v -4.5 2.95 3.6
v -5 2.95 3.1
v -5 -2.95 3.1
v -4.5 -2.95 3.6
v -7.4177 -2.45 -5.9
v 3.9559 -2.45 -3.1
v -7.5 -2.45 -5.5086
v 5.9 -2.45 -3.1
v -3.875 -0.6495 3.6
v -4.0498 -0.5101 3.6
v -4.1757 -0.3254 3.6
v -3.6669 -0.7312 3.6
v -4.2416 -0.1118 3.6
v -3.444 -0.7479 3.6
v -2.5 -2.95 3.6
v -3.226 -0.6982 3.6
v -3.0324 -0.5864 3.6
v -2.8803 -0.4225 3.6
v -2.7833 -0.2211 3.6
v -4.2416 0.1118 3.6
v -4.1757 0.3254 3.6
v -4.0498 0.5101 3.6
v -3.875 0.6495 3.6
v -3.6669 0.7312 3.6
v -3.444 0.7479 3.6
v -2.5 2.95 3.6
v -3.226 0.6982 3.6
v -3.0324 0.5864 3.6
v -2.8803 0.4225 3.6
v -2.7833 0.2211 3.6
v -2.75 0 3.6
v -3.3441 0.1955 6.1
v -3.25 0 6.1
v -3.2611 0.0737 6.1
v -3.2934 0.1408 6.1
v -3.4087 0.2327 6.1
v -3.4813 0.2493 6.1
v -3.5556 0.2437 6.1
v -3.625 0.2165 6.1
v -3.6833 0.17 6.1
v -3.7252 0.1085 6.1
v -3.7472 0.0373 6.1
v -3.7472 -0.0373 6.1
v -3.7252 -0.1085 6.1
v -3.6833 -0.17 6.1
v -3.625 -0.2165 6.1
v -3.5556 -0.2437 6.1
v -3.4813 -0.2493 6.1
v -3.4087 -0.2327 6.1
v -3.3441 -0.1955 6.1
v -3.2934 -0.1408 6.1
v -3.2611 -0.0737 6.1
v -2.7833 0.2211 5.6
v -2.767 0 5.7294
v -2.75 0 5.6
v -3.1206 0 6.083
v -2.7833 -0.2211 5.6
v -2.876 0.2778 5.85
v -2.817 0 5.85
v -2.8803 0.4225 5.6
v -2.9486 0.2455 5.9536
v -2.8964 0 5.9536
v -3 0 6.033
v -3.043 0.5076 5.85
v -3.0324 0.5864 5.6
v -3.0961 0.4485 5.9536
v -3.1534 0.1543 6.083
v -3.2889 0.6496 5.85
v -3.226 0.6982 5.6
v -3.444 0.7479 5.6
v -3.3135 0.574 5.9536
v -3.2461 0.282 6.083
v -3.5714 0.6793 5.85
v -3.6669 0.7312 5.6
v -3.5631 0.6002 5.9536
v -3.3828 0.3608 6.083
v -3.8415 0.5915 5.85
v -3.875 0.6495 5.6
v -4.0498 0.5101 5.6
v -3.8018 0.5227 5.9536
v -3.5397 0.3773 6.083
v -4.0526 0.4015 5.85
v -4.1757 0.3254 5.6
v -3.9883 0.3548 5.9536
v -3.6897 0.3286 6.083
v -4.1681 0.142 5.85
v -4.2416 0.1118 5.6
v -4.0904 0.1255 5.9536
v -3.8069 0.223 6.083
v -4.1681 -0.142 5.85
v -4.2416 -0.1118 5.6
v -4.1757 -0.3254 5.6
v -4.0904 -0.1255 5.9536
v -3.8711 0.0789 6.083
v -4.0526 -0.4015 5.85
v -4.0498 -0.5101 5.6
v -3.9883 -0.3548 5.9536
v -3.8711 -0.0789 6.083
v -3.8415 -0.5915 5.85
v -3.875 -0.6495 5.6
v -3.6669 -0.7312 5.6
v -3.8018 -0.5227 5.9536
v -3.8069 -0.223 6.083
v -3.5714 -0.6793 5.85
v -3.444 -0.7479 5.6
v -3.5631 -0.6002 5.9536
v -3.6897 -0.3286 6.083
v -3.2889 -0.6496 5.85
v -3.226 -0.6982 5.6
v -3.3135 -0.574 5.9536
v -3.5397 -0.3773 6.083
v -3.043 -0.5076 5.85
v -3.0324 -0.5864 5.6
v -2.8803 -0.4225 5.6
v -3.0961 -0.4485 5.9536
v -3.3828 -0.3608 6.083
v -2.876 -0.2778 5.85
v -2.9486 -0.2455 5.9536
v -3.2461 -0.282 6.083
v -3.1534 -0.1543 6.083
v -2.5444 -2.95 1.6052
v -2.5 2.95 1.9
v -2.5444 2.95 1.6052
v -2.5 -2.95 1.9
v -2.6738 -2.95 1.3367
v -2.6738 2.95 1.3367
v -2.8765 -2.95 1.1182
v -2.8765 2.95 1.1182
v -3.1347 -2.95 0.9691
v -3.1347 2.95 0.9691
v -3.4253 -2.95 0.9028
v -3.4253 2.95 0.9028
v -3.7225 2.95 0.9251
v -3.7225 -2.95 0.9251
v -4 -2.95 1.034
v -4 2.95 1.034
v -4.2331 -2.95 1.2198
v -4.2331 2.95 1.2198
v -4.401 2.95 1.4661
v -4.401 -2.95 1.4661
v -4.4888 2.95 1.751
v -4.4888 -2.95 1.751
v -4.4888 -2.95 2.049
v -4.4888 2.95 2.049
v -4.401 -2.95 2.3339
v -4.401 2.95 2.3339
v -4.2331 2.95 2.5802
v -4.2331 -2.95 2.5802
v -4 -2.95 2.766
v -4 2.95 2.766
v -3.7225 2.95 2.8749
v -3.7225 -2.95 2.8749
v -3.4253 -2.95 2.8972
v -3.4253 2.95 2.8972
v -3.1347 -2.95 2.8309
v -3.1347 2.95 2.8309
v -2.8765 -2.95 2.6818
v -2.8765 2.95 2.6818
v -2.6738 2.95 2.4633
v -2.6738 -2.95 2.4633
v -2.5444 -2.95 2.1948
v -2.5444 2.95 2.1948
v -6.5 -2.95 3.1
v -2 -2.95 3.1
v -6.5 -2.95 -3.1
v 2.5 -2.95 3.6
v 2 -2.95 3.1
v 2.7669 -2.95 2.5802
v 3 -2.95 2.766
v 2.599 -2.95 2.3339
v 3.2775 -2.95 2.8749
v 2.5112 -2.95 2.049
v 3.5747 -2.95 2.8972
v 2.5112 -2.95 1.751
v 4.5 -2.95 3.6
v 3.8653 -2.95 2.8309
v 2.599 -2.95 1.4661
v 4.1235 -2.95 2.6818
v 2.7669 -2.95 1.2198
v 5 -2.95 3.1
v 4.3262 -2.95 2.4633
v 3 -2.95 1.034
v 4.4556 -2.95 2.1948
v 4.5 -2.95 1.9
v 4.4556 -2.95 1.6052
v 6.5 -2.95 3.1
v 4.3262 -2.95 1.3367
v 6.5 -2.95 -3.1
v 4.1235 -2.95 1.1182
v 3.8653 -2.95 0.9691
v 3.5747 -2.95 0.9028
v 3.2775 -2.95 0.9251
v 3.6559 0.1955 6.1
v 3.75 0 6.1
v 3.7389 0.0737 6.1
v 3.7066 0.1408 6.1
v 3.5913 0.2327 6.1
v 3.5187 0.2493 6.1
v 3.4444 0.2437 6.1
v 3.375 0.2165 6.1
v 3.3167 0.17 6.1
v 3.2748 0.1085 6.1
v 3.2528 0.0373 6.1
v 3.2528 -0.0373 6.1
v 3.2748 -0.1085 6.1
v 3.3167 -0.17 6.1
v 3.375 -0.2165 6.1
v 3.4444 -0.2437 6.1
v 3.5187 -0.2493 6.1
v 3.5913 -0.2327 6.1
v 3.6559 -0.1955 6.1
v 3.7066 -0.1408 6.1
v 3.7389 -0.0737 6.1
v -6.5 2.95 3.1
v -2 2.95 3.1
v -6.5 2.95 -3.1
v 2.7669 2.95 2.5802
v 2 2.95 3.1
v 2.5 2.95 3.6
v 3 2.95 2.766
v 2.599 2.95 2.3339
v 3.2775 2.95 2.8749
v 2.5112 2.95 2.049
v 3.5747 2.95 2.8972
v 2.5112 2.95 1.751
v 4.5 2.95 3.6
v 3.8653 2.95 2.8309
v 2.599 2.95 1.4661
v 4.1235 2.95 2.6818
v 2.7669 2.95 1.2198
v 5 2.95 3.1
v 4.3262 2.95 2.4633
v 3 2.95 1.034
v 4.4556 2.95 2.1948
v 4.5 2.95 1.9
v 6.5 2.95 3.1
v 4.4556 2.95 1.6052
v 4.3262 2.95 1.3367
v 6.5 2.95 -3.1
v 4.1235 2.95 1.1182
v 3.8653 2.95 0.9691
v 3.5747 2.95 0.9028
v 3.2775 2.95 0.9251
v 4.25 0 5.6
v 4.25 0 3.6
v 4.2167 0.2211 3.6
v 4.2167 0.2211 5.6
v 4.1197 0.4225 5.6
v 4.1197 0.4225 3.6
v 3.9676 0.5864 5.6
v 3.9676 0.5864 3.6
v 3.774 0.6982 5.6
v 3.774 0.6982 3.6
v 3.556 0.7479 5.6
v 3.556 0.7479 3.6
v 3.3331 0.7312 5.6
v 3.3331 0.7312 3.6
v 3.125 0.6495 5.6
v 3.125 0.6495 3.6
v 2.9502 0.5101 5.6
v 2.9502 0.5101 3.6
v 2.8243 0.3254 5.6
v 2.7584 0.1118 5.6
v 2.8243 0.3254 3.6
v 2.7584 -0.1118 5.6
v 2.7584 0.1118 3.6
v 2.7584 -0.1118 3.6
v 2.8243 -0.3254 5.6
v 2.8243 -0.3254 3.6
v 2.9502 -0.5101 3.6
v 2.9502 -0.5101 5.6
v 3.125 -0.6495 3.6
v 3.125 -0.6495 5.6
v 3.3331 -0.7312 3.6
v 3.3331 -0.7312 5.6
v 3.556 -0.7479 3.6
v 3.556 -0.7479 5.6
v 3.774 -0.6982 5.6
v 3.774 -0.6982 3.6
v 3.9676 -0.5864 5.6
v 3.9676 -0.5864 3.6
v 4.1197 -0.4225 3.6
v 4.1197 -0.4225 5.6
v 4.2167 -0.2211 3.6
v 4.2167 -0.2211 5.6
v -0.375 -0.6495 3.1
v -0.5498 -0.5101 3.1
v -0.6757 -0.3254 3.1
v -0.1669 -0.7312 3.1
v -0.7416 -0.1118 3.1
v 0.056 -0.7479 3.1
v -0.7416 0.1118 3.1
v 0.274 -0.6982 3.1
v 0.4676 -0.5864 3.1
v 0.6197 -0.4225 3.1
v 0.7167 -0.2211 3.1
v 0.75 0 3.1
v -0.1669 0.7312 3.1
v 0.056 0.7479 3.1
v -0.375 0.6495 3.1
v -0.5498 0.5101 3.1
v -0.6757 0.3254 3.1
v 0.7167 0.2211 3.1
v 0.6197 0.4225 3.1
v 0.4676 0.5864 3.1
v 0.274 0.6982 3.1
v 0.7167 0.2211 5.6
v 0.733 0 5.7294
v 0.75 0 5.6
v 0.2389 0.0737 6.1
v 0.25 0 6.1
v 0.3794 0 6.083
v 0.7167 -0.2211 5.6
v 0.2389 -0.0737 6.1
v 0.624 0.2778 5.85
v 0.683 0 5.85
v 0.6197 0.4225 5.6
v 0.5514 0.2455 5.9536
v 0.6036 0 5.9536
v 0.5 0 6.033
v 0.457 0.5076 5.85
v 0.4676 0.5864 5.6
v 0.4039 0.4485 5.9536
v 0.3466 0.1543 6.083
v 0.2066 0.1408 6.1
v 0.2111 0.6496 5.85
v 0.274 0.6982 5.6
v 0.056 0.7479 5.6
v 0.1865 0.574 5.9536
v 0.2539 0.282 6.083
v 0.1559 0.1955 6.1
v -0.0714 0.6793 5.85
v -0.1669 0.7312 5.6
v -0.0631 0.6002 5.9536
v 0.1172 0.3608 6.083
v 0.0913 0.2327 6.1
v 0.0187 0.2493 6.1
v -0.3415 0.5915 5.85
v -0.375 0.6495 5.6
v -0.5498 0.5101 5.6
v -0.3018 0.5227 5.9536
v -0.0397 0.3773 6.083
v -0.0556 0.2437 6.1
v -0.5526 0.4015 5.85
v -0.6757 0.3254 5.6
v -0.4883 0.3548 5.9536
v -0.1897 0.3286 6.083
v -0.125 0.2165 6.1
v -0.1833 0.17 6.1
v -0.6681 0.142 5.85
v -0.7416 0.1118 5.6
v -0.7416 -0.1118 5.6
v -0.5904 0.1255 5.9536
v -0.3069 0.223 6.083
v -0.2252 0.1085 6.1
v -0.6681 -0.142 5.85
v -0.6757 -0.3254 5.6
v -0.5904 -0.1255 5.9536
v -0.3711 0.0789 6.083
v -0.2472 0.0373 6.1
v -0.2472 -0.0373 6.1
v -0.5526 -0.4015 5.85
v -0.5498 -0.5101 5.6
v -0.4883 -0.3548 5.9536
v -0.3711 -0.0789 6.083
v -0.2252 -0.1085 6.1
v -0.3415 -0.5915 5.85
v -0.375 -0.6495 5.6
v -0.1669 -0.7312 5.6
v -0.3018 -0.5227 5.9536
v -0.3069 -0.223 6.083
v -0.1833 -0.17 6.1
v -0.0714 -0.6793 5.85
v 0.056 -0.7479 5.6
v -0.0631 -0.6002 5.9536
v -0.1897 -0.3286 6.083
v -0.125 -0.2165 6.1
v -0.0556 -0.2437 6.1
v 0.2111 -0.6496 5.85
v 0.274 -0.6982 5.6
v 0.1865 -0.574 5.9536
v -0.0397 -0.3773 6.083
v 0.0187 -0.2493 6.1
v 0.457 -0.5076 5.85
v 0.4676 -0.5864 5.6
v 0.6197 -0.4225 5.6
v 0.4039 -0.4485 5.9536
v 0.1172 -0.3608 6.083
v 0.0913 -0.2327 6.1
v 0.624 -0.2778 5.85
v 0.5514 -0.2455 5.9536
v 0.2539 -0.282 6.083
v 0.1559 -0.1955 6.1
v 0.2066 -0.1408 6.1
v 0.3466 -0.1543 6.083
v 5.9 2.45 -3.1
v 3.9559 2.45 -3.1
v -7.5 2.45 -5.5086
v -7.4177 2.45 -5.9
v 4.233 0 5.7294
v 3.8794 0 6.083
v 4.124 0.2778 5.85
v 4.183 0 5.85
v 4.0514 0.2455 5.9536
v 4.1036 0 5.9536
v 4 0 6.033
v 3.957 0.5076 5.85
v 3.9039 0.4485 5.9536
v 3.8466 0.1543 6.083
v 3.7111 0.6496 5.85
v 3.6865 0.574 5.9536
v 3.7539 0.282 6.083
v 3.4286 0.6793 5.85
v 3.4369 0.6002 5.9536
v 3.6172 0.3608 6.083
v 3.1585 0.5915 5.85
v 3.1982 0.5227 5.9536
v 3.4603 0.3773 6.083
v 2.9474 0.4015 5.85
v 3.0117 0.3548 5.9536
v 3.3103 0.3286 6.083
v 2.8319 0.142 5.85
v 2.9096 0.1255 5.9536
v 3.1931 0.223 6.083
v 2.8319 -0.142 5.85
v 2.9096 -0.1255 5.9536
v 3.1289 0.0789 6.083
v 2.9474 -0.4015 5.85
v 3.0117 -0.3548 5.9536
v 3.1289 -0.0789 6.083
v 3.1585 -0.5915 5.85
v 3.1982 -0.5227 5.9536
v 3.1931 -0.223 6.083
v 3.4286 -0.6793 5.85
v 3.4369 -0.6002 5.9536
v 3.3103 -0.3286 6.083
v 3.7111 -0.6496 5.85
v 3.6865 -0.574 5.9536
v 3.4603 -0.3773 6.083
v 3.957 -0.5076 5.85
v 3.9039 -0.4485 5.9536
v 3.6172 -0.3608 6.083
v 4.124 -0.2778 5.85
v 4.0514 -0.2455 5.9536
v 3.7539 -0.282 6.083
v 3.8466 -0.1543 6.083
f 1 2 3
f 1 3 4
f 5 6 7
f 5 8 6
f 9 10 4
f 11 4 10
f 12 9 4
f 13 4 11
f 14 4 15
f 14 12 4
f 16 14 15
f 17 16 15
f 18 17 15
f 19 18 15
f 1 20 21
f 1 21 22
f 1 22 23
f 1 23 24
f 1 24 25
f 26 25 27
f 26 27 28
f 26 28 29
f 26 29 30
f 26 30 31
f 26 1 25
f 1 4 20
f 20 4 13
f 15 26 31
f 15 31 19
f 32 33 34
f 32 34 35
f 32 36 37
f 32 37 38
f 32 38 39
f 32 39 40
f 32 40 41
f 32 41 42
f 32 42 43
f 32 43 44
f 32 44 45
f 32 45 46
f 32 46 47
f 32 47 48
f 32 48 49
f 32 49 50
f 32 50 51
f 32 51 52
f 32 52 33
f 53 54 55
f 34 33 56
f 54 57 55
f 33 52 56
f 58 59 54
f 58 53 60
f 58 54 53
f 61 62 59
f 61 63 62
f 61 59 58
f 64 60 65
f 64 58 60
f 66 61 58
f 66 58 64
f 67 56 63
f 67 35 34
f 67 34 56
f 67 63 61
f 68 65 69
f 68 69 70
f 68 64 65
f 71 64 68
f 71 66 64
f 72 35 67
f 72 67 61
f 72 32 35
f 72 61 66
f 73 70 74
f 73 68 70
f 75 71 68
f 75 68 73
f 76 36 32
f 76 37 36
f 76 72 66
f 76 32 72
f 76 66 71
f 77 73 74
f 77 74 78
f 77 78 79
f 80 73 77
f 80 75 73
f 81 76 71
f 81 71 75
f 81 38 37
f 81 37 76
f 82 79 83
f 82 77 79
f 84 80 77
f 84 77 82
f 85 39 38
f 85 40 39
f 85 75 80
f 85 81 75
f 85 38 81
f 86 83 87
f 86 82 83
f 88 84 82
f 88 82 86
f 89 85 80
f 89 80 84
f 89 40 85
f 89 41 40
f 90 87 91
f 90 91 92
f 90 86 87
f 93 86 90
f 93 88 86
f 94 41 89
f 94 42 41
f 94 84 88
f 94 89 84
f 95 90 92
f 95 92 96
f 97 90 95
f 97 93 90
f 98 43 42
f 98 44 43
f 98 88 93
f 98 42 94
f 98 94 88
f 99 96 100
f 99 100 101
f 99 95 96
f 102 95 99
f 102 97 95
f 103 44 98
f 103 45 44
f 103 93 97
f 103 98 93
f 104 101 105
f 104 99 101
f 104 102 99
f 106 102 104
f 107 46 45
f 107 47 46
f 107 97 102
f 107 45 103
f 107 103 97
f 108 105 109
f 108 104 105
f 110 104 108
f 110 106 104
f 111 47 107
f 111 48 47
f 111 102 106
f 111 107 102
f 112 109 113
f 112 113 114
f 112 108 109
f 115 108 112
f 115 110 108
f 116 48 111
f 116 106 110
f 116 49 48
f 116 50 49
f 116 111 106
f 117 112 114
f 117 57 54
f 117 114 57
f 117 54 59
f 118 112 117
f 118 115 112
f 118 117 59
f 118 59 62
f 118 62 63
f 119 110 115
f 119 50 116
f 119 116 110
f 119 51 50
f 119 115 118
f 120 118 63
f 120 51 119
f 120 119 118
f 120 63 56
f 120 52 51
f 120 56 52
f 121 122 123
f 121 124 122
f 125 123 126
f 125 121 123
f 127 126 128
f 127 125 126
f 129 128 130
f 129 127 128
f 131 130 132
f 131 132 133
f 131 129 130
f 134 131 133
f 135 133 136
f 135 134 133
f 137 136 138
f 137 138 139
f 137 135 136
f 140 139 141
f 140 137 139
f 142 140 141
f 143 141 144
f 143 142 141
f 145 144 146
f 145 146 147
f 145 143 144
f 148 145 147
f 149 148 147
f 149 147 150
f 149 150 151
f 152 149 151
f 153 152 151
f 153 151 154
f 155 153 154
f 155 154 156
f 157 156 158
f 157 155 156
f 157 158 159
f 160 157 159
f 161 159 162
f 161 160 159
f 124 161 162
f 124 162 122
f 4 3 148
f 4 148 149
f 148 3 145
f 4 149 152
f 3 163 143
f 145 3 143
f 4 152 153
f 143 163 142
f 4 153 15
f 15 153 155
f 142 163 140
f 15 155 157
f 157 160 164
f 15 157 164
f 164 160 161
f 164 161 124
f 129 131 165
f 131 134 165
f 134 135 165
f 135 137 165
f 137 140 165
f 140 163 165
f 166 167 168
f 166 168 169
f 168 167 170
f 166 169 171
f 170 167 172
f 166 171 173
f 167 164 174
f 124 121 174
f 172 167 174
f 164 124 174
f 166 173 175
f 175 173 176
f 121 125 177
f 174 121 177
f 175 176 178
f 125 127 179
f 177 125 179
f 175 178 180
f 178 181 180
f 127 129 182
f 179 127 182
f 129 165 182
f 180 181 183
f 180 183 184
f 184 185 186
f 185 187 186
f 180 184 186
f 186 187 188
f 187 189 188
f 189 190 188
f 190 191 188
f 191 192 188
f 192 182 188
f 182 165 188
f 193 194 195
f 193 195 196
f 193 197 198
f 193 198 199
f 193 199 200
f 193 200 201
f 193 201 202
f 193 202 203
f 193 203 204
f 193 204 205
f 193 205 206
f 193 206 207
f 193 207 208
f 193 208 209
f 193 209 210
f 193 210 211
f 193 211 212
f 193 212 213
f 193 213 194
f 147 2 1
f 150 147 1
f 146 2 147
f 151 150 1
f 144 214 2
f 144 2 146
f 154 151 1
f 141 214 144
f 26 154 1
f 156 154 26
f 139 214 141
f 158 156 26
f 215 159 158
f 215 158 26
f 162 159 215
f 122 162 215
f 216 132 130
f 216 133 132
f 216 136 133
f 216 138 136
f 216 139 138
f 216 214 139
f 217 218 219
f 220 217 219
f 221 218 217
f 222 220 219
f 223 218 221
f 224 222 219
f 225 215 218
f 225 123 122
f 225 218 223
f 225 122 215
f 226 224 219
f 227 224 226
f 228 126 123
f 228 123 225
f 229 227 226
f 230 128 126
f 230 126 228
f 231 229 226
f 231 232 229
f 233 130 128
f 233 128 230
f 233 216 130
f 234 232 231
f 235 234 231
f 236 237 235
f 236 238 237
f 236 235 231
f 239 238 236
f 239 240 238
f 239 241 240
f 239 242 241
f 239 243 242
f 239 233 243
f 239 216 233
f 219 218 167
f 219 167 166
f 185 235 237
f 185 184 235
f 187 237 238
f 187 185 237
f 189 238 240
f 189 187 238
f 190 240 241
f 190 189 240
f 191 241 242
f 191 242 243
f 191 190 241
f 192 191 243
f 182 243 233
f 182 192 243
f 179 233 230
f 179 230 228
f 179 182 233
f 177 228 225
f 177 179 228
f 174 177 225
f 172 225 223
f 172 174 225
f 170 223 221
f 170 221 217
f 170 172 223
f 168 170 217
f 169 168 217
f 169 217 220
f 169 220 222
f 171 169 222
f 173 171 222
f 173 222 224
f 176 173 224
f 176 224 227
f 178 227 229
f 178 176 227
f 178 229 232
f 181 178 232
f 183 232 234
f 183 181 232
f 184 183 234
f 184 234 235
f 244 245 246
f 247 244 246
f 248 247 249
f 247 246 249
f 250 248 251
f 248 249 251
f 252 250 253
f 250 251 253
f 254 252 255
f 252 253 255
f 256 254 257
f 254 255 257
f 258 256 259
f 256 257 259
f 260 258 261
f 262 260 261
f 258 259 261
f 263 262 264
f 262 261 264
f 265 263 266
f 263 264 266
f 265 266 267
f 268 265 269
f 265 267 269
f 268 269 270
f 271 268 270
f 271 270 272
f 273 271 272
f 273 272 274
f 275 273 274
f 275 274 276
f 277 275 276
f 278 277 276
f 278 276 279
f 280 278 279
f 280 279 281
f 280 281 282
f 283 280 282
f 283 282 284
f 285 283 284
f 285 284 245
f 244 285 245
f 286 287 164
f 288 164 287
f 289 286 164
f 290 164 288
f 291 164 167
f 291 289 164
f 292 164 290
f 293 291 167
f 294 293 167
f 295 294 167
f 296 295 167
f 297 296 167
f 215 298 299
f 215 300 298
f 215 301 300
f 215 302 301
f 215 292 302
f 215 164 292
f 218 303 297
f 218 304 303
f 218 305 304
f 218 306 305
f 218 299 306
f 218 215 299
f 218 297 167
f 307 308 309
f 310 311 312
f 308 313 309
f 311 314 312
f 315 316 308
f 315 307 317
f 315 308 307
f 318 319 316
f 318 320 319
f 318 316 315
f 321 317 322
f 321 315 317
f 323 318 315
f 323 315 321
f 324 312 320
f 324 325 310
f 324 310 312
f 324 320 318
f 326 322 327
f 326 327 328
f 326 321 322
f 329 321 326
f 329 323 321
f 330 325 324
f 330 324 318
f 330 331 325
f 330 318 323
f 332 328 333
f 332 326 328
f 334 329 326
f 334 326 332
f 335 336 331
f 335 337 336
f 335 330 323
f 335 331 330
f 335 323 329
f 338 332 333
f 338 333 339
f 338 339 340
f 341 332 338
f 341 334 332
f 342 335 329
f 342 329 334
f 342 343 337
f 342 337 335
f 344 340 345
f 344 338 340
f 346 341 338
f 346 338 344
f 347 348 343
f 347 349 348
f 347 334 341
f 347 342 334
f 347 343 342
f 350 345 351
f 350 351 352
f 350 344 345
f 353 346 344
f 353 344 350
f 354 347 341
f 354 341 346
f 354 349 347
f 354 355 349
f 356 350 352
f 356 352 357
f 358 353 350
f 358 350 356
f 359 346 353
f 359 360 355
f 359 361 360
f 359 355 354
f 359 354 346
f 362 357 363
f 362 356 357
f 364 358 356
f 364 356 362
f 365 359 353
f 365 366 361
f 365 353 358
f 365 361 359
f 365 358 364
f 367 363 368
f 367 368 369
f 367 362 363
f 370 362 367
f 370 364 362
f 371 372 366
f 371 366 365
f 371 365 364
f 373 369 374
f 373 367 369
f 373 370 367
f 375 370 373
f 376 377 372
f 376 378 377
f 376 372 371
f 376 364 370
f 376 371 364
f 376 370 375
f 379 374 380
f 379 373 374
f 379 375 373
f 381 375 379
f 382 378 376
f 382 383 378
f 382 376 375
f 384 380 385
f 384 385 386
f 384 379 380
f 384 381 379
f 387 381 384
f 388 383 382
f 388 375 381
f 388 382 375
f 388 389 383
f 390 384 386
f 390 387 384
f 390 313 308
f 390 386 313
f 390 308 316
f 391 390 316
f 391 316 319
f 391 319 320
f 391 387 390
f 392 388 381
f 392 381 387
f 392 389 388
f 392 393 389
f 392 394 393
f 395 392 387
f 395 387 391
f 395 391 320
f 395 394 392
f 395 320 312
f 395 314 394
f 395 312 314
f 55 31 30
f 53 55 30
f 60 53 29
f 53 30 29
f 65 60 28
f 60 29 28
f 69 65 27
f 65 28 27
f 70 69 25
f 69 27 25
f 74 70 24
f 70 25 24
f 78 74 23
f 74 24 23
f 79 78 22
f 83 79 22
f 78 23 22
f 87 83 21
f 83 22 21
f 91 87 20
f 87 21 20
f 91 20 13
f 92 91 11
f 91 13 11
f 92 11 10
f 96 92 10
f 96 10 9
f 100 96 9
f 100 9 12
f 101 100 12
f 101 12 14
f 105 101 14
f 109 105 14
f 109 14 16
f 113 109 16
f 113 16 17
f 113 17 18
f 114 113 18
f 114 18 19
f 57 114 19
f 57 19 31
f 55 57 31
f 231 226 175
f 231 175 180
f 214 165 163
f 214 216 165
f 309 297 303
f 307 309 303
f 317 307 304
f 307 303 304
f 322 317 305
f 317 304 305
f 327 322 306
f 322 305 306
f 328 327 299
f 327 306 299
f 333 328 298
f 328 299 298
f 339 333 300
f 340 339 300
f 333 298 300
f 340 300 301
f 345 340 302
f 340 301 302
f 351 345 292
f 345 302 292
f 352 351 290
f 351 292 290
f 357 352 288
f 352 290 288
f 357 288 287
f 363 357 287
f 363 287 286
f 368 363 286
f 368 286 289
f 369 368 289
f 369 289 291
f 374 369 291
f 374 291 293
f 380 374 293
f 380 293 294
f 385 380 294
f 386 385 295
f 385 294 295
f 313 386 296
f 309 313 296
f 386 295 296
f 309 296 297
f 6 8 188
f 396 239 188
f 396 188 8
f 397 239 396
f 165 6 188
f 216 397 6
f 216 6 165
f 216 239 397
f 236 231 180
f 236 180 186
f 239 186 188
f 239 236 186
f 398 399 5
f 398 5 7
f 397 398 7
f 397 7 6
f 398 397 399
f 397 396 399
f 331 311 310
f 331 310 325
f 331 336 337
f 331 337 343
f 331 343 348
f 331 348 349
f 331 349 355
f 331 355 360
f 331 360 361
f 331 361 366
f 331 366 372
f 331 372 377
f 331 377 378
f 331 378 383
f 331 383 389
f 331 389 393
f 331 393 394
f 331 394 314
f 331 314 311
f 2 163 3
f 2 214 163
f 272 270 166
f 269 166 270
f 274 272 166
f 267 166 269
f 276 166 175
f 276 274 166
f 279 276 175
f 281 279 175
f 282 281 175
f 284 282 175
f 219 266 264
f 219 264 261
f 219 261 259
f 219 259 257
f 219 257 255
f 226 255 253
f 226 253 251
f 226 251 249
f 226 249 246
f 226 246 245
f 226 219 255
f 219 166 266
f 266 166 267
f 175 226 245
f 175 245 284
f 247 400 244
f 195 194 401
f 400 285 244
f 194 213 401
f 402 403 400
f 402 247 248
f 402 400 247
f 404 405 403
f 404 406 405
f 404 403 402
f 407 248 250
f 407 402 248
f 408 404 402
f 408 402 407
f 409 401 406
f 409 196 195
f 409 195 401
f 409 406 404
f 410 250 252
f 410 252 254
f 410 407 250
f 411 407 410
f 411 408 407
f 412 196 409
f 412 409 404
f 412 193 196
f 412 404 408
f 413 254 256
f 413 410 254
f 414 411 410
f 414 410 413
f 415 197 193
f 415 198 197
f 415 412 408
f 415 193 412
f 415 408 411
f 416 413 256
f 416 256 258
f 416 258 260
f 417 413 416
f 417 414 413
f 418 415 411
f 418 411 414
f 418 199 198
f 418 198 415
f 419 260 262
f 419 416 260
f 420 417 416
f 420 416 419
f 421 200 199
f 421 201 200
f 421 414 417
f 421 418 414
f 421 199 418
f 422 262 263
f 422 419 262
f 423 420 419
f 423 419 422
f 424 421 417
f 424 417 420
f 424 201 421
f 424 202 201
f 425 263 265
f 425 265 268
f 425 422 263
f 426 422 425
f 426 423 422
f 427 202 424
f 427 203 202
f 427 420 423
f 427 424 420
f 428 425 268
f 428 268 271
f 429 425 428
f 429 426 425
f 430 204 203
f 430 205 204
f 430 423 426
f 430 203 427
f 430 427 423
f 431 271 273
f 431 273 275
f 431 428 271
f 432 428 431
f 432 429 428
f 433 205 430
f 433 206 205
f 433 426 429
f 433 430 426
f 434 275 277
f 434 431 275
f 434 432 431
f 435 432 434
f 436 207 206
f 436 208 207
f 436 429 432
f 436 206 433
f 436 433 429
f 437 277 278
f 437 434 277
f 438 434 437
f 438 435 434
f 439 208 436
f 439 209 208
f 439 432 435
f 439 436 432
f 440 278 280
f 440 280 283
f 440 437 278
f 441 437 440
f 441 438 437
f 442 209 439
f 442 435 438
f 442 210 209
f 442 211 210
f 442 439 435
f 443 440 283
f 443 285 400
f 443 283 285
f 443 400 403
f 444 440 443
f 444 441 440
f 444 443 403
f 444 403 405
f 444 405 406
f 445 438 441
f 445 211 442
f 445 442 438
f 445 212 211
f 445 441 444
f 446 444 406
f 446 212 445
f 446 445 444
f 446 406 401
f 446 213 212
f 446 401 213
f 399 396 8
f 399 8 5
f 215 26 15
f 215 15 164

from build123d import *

# Parameters (mm, degrees)
SKETCH1_R           = 1
BOSS_EXTRUDE1_DEPTH = 2.95
CUT_EXTRUDE1_DEPTH  = 0.5
SKETCH3_R           = 0.75
BOSS_EXTRUDE2_DEPTH = 3
FILLET1_R           = 0.5


with BuildPart() as part:
    # Sketch1 → Boss-Extrude1 (new body, symmetric)
    with BuildSketch(Plane(origin=(0, 0, 0), x_dir=(1, 0, 0), z_dir=(0, 1, 0))):
        Polygon((-6.5, -3.1), (-5, -3.1), (-4.5, -3.6), (-2.5, -3.6), (-2, -3.1), (2, -3.1), (2.5, -3.6), (4.5, -3.6), (5, -3.1), (6.5, -3.1), (6.5, 3.1), (5.9, 3.1), (-7.417700692, 5.9), (-7.5, 5.50855802), (3.955876716, 3.1), (-6.5, 3.1), align=None)
        with Locations((3.5, -1.9)):
            Circle(SKETCH1_R, mode=Mode.SUBTRACT)
        with Locations((-3.5, -1.9)):
            Circle(SKETCH1_R, mode=Mode.SUBTRACT)
    extrude(amount=BOSS_EXTRUDE1_DEPTH, both=True)

    # Sketch2 → Cut-Extrude1 (cut)
    with BuildSketch(Plane(origin=(0, 2.95, 0), x_dir=(1, 0, 0), z_dir=(0, 1, 0))):
        Polygon((5.9, 3.1), (3.955876716, 3.1), (-7.5, 5.50855802), (-7.417700692, 5.9), align=None)
    cut_extrude1 = extrude(amount=-CUT_EXTRUDE1_DEPTH, mode=Mode.SUBTRACT)

    # Mirror1: Cut-Extrude1 across plane
    add(cut_extrude1.mirror(Plane.ZX), mode=Mode.SUBTRACT)

    # Sketch3 → Boss-Extrude2 (add)
    with BuildSketch(Plane.XY.offset(3.1)):
        Circle(SKETCH3_R)
        with Locations((-3.5, 0)):
            Circle(SKETCH3_R)
        with Locations((3.5, 0)):
            Circle(SKETCH3_R)
    extrude(amount=BOSS_EXTRUDE2_DEPTH)

    # Fillet1
    fillet1_edges = [part.edges().sort_by_distance(p)[0] for p in [
        (-0.75, 0, 6.1),
        (-4.25, 0, 6.1),
        (2.75, 0, 6.1),
    ]]
    fillet(fillet1_edges, radius=FILLET1_R)


solid = part.part
